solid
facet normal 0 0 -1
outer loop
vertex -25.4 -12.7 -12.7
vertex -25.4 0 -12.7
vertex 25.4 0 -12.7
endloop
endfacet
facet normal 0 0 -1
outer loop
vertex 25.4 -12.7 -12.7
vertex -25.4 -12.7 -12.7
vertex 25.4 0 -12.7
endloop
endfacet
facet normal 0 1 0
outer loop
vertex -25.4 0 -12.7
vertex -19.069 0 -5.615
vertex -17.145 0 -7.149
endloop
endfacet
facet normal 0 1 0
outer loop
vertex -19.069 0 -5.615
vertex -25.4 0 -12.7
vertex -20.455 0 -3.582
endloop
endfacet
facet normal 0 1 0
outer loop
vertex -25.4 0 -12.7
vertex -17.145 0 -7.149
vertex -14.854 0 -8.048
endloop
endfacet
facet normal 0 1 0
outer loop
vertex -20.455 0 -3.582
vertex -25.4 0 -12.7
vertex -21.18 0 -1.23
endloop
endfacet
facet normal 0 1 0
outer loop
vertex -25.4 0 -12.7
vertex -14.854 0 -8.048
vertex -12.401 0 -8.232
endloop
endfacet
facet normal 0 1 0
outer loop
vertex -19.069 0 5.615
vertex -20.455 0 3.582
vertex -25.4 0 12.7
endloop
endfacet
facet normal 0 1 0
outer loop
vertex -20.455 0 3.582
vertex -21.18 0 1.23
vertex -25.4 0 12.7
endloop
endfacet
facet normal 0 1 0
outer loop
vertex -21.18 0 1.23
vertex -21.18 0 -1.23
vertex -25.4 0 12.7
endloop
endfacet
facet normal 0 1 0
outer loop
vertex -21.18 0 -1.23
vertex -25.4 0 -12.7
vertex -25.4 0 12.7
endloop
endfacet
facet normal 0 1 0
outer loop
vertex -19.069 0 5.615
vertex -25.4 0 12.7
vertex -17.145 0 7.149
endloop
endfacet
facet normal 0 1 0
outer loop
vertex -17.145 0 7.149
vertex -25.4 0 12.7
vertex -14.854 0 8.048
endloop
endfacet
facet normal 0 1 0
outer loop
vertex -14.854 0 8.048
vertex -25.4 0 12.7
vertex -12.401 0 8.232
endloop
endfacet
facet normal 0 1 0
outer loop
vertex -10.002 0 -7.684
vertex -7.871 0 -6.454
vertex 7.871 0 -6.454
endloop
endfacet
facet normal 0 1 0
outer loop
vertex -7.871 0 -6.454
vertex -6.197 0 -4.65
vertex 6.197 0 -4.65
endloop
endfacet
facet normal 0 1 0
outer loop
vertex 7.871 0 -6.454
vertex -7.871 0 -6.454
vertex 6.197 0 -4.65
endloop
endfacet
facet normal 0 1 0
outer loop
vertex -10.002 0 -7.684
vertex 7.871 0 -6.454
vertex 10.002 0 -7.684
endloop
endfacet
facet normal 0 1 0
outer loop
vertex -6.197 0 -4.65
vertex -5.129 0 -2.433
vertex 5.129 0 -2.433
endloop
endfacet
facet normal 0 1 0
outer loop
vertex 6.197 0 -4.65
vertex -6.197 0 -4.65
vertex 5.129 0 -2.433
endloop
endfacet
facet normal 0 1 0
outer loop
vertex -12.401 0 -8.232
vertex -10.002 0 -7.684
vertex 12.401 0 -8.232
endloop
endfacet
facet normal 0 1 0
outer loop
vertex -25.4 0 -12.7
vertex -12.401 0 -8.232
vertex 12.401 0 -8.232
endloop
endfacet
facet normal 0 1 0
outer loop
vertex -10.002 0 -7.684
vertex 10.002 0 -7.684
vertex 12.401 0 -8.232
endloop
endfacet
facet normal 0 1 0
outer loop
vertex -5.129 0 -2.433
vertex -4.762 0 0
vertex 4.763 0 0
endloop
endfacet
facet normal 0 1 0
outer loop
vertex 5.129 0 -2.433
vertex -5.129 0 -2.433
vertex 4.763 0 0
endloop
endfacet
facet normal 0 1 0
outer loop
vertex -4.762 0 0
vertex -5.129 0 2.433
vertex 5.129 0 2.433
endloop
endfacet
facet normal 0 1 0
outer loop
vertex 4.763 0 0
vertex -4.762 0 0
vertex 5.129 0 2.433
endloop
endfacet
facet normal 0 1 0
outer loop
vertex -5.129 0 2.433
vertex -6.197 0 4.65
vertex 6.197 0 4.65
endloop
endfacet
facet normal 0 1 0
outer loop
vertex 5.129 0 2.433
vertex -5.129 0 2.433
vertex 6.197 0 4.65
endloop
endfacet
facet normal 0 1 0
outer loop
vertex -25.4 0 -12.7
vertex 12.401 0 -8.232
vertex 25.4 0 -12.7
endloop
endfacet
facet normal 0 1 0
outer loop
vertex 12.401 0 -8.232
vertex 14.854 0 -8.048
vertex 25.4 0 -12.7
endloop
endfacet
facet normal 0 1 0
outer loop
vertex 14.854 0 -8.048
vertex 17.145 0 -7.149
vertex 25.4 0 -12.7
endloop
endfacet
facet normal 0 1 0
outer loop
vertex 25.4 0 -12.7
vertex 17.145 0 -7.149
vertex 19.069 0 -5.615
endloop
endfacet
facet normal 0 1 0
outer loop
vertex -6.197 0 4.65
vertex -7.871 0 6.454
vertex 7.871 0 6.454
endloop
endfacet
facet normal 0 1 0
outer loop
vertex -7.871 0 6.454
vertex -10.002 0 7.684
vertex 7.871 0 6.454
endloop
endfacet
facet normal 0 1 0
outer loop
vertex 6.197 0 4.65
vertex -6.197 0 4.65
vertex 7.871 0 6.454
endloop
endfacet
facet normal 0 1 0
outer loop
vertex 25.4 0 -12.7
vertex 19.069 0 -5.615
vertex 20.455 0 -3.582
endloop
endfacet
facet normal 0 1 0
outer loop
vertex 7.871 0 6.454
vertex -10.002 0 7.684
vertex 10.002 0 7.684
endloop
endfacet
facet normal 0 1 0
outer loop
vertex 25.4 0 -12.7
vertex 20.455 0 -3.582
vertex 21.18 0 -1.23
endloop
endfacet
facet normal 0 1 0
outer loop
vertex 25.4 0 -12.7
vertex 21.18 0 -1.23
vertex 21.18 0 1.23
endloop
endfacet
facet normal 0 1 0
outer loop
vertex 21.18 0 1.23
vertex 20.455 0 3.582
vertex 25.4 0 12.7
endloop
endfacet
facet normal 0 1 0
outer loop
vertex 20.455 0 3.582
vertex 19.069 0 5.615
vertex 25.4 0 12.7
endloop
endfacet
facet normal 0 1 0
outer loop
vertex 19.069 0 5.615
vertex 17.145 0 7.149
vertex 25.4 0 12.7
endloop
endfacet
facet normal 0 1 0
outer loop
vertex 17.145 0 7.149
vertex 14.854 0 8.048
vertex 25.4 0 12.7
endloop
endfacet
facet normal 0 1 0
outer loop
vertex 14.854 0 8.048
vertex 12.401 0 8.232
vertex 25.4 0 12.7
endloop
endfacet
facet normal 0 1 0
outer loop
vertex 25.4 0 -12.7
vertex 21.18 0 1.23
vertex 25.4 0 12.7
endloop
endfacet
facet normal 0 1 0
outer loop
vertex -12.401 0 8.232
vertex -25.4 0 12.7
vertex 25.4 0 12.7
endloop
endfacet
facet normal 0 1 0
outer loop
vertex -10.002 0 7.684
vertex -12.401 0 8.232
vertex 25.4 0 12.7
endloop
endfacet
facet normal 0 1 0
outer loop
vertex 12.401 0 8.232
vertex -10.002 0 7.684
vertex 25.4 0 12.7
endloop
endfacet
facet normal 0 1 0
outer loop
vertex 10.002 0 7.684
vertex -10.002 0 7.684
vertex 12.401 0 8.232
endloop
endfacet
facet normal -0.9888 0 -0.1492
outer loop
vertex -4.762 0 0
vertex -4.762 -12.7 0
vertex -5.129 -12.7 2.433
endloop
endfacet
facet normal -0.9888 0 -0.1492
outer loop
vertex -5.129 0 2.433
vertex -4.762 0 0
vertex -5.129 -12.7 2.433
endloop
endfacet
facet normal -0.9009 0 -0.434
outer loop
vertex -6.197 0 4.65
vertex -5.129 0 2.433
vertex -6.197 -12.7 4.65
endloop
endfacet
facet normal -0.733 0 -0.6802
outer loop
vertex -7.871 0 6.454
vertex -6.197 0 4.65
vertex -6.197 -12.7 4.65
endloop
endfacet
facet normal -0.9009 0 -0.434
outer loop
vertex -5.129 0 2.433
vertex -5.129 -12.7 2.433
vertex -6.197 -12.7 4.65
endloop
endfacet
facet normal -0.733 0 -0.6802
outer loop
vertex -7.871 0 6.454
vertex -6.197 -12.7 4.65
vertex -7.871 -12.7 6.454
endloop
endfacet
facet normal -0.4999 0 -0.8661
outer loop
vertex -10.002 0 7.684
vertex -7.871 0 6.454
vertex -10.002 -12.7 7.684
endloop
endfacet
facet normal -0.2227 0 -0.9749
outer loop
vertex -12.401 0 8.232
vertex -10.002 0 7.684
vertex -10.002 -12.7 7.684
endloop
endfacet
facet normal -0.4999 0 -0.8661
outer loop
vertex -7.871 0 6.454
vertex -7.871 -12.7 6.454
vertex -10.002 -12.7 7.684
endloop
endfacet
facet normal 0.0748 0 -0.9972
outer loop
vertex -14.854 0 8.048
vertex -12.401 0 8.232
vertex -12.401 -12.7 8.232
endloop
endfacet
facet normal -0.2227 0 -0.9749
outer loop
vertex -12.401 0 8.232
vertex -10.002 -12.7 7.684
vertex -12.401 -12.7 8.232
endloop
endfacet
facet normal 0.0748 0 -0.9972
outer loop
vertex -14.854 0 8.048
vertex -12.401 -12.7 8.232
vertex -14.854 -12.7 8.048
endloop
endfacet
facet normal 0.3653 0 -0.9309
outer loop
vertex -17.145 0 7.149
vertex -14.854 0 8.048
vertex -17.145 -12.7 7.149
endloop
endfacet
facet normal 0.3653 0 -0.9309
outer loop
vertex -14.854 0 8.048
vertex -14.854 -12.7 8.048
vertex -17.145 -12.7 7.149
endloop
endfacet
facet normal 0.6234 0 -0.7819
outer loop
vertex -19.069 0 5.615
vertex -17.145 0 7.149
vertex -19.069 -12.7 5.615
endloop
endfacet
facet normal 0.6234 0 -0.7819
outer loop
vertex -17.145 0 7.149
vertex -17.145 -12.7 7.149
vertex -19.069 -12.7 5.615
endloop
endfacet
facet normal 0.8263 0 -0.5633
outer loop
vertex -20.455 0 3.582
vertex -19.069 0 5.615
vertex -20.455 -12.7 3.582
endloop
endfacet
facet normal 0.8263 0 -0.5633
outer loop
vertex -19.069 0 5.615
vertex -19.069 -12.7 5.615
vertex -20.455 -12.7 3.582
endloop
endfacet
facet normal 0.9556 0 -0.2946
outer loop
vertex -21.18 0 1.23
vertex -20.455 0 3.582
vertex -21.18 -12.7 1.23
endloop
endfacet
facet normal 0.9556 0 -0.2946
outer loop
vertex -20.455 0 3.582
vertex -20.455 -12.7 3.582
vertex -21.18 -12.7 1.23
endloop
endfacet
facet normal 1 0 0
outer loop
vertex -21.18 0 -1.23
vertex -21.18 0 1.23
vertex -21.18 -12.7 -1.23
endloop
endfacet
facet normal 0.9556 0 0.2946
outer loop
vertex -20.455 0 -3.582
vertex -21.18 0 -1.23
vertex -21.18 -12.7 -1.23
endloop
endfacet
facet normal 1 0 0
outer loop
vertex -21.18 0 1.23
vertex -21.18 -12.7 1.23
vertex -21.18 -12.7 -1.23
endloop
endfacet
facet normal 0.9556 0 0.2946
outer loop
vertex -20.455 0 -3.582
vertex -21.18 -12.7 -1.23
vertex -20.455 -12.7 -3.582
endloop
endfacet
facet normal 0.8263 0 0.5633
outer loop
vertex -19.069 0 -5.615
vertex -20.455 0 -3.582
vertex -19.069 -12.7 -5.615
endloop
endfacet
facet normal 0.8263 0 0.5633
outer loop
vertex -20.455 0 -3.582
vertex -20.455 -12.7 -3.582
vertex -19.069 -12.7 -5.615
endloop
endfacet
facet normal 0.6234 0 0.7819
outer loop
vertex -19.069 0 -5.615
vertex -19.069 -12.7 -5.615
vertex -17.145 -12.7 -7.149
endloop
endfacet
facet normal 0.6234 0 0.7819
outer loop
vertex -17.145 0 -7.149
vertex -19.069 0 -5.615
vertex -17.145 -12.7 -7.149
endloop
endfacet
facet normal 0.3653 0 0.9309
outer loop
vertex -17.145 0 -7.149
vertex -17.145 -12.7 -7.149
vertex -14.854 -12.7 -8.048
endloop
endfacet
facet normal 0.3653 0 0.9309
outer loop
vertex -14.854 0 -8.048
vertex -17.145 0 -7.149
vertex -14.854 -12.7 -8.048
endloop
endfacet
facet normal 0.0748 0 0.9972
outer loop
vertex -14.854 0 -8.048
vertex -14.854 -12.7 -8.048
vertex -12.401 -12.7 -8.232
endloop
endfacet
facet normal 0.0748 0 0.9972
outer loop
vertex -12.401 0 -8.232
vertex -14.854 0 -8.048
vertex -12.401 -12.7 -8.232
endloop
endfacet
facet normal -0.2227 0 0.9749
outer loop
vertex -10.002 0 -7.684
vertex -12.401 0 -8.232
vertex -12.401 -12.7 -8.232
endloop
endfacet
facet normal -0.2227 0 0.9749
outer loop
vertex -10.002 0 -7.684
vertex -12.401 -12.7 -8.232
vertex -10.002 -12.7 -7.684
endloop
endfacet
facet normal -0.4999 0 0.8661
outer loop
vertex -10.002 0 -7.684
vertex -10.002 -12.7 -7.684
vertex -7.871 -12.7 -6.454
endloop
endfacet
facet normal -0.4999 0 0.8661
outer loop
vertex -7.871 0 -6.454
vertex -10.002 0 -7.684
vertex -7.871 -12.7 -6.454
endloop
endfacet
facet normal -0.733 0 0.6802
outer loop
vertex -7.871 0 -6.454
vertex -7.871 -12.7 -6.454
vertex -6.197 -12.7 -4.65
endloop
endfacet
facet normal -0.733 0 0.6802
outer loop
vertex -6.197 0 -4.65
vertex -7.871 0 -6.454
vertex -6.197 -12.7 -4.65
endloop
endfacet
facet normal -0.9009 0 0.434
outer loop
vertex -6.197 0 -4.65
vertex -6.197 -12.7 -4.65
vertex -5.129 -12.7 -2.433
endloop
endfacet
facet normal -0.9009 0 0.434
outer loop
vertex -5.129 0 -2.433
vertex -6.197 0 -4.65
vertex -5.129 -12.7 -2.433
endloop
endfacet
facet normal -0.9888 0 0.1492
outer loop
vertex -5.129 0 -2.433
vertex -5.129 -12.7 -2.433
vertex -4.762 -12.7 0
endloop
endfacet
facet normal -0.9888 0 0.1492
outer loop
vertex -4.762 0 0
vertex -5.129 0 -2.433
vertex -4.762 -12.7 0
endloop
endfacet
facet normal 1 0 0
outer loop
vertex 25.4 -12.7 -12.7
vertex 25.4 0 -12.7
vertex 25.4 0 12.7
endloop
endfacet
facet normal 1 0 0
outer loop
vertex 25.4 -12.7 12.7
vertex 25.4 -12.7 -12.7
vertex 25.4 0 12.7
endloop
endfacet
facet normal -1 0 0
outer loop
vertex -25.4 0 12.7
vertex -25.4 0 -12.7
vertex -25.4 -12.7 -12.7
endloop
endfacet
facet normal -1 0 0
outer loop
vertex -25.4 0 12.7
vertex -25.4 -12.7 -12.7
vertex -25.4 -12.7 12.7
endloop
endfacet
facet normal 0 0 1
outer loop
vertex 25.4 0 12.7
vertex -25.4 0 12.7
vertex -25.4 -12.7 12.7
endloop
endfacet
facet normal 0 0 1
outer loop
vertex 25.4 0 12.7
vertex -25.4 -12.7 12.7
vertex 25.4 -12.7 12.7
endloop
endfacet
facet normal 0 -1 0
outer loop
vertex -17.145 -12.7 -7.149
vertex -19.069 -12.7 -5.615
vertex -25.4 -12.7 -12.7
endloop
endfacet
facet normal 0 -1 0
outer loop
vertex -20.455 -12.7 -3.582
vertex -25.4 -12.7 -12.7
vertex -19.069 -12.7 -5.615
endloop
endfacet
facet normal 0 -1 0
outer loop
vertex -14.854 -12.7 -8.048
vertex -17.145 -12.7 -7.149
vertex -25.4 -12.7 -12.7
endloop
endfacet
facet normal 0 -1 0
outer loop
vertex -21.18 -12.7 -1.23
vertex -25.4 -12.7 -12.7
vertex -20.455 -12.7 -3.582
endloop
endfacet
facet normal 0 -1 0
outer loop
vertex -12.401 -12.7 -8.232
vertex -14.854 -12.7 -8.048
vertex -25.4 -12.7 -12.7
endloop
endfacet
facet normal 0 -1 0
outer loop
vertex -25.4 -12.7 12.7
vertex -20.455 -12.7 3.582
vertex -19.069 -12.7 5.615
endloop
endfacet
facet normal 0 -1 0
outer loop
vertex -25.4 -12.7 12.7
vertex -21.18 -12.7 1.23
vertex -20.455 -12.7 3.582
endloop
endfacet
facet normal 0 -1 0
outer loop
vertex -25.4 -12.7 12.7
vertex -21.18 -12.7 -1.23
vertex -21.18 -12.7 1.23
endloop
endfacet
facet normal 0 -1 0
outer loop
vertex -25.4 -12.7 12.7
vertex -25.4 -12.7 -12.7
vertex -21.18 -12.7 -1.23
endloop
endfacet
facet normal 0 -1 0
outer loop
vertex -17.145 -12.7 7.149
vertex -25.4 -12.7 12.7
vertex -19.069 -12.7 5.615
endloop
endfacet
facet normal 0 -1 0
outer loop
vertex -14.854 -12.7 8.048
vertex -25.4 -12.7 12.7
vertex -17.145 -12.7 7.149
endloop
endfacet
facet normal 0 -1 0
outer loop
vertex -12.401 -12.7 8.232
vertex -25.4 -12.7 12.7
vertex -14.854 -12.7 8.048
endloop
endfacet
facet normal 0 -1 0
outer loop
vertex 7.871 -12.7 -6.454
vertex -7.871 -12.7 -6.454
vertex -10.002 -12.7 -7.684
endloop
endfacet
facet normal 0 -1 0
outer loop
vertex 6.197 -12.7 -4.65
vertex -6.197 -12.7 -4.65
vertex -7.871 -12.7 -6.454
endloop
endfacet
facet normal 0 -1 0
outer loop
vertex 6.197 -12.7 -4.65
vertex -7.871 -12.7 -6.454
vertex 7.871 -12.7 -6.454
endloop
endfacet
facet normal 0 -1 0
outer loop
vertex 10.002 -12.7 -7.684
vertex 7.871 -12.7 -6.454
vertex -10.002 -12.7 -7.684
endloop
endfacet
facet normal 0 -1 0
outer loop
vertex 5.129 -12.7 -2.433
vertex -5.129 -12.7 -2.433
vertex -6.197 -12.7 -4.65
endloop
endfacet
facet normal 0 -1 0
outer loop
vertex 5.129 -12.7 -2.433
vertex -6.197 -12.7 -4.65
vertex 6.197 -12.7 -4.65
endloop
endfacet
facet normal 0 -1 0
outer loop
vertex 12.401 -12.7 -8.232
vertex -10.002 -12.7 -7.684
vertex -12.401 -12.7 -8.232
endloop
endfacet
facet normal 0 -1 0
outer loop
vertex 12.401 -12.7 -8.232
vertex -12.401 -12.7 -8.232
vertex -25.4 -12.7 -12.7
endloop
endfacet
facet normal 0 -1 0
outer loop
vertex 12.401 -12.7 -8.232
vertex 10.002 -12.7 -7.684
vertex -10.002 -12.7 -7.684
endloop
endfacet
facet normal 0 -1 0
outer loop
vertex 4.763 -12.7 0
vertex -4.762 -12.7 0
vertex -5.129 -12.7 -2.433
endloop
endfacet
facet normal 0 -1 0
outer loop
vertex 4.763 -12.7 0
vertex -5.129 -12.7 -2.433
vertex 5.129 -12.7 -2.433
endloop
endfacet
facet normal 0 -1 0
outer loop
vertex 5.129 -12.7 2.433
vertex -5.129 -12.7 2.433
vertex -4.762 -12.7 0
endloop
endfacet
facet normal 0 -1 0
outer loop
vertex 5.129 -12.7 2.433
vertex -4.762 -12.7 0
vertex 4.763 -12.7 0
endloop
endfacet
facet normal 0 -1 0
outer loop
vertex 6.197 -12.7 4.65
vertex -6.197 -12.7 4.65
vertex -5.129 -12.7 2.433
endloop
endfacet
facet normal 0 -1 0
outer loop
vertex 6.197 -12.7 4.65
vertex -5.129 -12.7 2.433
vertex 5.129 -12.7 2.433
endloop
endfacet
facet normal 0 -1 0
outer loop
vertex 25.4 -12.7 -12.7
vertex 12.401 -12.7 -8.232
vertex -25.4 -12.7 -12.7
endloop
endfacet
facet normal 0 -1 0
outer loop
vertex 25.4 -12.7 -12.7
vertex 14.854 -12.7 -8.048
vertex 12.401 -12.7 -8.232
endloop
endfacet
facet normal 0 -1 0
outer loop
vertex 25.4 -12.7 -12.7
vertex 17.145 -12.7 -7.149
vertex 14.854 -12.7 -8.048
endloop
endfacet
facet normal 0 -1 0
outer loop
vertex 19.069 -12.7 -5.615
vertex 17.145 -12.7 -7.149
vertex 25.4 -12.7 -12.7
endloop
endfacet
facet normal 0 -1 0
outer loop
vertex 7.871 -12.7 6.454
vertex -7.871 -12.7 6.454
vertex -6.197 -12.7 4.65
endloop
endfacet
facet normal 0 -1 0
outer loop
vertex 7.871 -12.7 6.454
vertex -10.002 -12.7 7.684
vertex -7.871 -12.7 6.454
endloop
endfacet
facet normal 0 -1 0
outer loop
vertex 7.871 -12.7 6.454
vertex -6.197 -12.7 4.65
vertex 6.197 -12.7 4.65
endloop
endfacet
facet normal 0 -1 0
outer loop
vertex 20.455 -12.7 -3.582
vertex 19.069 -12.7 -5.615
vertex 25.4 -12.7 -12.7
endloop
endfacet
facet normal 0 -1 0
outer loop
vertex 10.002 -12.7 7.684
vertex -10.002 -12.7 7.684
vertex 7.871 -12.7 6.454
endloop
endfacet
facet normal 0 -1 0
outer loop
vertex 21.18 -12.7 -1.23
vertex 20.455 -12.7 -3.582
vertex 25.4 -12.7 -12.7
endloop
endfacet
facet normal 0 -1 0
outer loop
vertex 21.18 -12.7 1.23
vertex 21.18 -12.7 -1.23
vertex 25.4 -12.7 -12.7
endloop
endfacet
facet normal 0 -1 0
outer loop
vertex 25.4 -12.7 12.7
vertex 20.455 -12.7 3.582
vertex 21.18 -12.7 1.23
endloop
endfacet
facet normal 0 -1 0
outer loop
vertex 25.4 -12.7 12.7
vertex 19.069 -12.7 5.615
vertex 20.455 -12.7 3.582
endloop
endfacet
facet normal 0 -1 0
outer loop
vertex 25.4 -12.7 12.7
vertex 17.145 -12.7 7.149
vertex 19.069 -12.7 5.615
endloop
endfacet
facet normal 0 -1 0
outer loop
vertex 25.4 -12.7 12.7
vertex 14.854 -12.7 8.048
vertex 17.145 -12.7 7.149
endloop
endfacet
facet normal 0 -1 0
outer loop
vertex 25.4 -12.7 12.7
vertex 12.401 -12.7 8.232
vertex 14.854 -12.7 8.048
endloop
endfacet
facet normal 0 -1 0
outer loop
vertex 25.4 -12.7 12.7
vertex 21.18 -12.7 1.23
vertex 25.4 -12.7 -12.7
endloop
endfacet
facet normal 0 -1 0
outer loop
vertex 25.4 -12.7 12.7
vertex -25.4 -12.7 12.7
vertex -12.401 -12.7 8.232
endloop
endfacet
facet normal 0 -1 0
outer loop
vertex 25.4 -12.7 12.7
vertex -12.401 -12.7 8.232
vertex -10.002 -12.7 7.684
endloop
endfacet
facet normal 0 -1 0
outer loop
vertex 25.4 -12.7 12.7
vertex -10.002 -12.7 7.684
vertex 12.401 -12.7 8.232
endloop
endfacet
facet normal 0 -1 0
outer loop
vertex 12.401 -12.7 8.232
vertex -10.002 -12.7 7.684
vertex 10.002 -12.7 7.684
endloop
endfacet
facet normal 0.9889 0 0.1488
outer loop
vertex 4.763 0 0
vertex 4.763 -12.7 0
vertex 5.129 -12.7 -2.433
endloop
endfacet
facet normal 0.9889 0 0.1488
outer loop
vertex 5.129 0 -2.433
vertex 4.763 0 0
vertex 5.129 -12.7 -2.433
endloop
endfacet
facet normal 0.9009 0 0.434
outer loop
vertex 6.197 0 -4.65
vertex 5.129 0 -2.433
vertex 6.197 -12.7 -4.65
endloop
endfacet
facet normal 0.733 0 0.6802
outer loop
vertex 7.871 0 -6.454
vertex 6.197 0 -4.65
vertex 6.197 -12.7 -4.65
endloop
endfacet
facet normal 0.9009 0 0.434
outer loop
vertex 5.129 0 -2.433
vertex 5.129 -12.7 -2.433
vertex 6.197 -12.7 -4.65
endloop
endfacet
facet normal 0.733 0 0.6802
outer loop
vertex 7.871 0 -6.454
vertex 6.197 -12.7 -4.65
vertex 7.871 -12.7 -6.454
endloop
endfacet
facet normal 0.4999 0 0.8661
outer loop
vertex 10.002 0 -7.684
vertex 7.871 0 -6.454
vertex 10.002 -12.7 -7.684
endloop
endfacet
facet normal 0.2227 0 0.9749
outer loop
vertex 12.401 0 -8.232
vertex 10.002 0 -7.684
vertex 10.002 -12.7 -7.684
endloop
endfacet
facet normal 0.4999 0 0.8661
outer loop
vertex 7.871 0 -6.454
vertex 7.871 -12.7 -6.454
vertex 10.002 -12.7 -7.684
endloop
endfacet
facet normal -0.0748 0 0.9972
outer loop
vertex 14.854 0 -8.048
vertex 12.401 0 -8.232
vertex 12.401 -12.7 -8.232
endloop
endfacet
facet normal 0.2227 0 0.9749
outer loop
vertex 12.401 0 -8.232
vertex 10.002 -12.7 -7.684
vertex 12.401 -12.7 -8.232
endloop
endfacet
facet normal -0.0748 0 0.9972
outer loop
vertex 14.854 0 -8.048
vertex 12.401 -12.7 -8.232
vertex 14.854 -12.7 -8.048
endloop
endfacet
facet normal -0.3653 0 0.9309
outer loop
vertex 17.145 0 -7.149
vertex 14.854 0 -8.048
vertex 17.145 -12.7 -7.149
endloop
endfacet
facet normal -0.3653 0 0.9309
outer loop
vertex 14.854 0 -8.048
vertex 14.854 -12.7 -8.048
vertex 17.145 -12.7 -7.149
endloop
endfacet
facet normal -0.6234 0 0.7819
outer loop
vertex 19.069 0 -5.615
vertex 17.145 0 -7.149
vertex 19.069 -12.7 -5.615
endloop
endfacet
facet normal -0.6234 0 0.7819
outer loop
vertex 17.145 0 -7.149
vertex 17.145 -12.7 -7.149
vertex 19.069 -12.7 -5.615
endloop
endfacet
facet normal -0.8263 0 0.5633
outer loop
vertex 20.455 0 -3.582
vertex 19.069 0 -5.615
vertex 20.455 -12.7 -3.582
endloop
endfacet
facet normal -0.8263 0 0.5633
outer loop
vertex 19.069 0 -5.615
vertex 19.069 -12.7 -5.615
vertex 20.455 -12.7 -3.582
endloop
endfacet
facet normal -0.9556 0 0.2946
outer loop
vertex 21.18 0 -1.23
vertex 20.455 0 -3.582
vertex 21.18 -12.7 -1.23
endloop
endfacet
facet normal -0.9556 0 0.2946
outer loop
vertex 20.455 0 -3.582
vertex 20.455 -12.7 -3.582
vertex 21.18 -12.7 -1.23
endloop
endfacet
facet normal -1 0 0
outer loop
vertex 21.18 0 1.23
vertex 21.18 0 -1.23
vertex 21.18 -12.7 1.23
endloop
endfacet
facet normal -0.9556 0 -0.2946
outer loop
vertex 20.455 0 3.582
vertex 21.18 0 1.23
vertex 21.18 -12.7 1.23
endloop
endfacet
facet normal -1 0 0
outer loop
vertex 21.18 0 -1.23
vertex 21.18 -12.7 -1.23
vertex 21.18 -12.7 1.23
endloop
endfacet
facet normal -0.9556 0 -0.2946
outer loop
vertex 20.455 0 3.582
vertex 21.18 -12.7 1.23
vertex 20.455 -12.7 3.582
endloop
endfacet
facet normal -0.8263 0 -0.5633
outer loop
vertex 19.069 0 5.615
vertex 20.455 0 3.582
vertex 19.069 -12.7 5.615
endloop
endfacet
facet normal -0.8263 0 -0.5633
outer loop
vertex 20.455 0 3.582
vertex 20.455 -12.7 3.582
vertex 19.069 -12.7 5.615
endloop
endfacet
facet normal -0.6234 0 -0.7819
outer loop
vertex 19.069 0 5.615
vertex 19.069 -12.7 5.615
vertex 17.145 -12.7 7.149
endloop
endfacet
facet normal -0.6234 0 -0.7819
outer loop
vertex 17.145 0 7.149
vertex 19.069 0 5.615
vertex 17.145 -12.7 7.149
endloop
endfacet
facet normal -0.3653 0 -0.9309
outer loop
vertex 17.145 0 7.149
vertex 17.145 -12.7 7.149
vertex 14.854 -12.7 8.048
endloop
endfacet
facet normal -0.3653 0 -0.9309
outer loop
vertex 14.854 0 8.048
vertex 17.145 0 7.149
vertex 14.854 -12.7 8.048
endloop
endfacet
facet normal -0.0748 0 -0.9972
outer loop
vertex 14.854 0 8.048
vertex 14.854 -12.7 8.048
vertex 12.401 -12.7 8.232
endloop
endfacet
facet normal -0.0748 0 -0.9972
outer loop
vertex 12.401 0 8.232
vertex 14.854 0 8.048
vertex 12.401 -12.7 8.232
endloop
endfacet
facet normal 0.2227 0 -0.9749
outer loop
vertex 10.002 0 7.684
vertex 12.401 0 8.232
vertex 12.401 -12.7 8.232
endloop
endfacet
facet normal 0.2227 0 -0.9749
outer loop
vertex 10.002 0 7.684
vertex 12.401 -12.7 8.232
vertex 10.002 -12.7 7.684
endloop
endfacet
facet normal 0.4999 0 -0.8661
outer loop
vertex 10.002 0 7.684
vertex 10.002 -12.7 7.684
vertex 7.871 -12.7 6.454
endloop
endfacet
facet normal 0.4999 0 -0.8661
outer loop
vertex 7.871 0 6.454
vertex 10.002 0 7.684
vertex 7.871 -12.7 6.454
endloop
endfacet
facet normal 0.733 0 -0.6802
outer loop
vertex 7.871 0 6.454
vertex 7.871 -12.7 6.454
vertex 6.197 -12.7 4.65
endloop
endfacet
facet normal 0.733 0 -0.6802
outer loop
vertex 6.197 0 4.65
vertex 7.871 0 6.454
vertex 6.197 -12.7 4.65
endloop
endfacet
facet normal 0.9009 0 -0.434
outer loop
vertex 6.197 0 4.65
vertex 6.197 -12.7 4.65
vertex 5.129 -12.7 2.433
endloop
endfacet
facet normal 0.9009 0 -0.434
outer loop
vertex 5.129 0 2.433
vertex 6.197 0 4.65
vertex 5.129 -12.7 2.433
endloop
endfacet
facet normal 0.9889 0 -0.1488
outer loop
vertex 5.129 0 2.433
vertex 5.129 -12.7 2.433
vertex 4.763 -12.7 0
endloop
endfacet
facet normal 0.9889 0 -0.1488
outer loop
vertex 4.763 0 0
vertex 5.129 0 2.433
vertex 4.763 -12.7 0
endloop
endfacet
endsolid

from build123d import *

# Parameters (mm, degrees)
F0_W     = 50.8
F0_H     = 50.8
F1_DEPTH = 25.4
F2_R     = 8.255
F3_DEPTH = 25.4
F4_DEPTH = 12.7
F5_DEPTH = 12.7
F6_DEPTH = 12.7


with BuildPart() as f1:
    # F0 (on Front) → F1 (new body)
    with BuildSketch(Plane.XZ):
        Rectangle(F0_W, F0_H)
    extrude(amount=F1_DEPTH)

    # F2 (on face) → F3 (cut)
    with BuildSketch(Plane.XZ.offset(25.4)):
        with Locations((-13.0175, 0)):
            Circle(F2_R)
        with BuildLine():
            ThreePointArc((21.2725, 0), (13.0175, 8.255), (4.7625, 0))
            ThreePointArc((4.7625, 0), (13.0175, -8.255), (21.2725, 0))
        make_face()
    extrude(amount=-F3_DEPTH, mode=Mode.SUBTRACT)

    # F4 (cut): a face of the model
    f4_faces = [f1.faces().sort_by_distance(p)[0] for p in [
        (0, -25.4, 0),
    ]]
    extrude(f4_faces, amount=-F4_DEPTH, mode=Mode.SUBTRACT)

    # F5 (cut): a face of the model
    f5_faces = [f1.faces().sort_by_distance(p)[0] for p in [
        (0, -6.35, 25.4),
    ]]
    extrude(f5_faces, amount=-F5_DEPTH, mode=Mode.SUBTRACT)

    # F6 (cut): a face of the model
    f6_faces = [f1.faces().sort_by_distance(p)[0] for p in [
        (0, -6.35, -25.4),
    ]]
    extrude(f6_faces, amount=-F6_DEPTH, mode=Mode.SUBTRACT)


solid = f1.part
